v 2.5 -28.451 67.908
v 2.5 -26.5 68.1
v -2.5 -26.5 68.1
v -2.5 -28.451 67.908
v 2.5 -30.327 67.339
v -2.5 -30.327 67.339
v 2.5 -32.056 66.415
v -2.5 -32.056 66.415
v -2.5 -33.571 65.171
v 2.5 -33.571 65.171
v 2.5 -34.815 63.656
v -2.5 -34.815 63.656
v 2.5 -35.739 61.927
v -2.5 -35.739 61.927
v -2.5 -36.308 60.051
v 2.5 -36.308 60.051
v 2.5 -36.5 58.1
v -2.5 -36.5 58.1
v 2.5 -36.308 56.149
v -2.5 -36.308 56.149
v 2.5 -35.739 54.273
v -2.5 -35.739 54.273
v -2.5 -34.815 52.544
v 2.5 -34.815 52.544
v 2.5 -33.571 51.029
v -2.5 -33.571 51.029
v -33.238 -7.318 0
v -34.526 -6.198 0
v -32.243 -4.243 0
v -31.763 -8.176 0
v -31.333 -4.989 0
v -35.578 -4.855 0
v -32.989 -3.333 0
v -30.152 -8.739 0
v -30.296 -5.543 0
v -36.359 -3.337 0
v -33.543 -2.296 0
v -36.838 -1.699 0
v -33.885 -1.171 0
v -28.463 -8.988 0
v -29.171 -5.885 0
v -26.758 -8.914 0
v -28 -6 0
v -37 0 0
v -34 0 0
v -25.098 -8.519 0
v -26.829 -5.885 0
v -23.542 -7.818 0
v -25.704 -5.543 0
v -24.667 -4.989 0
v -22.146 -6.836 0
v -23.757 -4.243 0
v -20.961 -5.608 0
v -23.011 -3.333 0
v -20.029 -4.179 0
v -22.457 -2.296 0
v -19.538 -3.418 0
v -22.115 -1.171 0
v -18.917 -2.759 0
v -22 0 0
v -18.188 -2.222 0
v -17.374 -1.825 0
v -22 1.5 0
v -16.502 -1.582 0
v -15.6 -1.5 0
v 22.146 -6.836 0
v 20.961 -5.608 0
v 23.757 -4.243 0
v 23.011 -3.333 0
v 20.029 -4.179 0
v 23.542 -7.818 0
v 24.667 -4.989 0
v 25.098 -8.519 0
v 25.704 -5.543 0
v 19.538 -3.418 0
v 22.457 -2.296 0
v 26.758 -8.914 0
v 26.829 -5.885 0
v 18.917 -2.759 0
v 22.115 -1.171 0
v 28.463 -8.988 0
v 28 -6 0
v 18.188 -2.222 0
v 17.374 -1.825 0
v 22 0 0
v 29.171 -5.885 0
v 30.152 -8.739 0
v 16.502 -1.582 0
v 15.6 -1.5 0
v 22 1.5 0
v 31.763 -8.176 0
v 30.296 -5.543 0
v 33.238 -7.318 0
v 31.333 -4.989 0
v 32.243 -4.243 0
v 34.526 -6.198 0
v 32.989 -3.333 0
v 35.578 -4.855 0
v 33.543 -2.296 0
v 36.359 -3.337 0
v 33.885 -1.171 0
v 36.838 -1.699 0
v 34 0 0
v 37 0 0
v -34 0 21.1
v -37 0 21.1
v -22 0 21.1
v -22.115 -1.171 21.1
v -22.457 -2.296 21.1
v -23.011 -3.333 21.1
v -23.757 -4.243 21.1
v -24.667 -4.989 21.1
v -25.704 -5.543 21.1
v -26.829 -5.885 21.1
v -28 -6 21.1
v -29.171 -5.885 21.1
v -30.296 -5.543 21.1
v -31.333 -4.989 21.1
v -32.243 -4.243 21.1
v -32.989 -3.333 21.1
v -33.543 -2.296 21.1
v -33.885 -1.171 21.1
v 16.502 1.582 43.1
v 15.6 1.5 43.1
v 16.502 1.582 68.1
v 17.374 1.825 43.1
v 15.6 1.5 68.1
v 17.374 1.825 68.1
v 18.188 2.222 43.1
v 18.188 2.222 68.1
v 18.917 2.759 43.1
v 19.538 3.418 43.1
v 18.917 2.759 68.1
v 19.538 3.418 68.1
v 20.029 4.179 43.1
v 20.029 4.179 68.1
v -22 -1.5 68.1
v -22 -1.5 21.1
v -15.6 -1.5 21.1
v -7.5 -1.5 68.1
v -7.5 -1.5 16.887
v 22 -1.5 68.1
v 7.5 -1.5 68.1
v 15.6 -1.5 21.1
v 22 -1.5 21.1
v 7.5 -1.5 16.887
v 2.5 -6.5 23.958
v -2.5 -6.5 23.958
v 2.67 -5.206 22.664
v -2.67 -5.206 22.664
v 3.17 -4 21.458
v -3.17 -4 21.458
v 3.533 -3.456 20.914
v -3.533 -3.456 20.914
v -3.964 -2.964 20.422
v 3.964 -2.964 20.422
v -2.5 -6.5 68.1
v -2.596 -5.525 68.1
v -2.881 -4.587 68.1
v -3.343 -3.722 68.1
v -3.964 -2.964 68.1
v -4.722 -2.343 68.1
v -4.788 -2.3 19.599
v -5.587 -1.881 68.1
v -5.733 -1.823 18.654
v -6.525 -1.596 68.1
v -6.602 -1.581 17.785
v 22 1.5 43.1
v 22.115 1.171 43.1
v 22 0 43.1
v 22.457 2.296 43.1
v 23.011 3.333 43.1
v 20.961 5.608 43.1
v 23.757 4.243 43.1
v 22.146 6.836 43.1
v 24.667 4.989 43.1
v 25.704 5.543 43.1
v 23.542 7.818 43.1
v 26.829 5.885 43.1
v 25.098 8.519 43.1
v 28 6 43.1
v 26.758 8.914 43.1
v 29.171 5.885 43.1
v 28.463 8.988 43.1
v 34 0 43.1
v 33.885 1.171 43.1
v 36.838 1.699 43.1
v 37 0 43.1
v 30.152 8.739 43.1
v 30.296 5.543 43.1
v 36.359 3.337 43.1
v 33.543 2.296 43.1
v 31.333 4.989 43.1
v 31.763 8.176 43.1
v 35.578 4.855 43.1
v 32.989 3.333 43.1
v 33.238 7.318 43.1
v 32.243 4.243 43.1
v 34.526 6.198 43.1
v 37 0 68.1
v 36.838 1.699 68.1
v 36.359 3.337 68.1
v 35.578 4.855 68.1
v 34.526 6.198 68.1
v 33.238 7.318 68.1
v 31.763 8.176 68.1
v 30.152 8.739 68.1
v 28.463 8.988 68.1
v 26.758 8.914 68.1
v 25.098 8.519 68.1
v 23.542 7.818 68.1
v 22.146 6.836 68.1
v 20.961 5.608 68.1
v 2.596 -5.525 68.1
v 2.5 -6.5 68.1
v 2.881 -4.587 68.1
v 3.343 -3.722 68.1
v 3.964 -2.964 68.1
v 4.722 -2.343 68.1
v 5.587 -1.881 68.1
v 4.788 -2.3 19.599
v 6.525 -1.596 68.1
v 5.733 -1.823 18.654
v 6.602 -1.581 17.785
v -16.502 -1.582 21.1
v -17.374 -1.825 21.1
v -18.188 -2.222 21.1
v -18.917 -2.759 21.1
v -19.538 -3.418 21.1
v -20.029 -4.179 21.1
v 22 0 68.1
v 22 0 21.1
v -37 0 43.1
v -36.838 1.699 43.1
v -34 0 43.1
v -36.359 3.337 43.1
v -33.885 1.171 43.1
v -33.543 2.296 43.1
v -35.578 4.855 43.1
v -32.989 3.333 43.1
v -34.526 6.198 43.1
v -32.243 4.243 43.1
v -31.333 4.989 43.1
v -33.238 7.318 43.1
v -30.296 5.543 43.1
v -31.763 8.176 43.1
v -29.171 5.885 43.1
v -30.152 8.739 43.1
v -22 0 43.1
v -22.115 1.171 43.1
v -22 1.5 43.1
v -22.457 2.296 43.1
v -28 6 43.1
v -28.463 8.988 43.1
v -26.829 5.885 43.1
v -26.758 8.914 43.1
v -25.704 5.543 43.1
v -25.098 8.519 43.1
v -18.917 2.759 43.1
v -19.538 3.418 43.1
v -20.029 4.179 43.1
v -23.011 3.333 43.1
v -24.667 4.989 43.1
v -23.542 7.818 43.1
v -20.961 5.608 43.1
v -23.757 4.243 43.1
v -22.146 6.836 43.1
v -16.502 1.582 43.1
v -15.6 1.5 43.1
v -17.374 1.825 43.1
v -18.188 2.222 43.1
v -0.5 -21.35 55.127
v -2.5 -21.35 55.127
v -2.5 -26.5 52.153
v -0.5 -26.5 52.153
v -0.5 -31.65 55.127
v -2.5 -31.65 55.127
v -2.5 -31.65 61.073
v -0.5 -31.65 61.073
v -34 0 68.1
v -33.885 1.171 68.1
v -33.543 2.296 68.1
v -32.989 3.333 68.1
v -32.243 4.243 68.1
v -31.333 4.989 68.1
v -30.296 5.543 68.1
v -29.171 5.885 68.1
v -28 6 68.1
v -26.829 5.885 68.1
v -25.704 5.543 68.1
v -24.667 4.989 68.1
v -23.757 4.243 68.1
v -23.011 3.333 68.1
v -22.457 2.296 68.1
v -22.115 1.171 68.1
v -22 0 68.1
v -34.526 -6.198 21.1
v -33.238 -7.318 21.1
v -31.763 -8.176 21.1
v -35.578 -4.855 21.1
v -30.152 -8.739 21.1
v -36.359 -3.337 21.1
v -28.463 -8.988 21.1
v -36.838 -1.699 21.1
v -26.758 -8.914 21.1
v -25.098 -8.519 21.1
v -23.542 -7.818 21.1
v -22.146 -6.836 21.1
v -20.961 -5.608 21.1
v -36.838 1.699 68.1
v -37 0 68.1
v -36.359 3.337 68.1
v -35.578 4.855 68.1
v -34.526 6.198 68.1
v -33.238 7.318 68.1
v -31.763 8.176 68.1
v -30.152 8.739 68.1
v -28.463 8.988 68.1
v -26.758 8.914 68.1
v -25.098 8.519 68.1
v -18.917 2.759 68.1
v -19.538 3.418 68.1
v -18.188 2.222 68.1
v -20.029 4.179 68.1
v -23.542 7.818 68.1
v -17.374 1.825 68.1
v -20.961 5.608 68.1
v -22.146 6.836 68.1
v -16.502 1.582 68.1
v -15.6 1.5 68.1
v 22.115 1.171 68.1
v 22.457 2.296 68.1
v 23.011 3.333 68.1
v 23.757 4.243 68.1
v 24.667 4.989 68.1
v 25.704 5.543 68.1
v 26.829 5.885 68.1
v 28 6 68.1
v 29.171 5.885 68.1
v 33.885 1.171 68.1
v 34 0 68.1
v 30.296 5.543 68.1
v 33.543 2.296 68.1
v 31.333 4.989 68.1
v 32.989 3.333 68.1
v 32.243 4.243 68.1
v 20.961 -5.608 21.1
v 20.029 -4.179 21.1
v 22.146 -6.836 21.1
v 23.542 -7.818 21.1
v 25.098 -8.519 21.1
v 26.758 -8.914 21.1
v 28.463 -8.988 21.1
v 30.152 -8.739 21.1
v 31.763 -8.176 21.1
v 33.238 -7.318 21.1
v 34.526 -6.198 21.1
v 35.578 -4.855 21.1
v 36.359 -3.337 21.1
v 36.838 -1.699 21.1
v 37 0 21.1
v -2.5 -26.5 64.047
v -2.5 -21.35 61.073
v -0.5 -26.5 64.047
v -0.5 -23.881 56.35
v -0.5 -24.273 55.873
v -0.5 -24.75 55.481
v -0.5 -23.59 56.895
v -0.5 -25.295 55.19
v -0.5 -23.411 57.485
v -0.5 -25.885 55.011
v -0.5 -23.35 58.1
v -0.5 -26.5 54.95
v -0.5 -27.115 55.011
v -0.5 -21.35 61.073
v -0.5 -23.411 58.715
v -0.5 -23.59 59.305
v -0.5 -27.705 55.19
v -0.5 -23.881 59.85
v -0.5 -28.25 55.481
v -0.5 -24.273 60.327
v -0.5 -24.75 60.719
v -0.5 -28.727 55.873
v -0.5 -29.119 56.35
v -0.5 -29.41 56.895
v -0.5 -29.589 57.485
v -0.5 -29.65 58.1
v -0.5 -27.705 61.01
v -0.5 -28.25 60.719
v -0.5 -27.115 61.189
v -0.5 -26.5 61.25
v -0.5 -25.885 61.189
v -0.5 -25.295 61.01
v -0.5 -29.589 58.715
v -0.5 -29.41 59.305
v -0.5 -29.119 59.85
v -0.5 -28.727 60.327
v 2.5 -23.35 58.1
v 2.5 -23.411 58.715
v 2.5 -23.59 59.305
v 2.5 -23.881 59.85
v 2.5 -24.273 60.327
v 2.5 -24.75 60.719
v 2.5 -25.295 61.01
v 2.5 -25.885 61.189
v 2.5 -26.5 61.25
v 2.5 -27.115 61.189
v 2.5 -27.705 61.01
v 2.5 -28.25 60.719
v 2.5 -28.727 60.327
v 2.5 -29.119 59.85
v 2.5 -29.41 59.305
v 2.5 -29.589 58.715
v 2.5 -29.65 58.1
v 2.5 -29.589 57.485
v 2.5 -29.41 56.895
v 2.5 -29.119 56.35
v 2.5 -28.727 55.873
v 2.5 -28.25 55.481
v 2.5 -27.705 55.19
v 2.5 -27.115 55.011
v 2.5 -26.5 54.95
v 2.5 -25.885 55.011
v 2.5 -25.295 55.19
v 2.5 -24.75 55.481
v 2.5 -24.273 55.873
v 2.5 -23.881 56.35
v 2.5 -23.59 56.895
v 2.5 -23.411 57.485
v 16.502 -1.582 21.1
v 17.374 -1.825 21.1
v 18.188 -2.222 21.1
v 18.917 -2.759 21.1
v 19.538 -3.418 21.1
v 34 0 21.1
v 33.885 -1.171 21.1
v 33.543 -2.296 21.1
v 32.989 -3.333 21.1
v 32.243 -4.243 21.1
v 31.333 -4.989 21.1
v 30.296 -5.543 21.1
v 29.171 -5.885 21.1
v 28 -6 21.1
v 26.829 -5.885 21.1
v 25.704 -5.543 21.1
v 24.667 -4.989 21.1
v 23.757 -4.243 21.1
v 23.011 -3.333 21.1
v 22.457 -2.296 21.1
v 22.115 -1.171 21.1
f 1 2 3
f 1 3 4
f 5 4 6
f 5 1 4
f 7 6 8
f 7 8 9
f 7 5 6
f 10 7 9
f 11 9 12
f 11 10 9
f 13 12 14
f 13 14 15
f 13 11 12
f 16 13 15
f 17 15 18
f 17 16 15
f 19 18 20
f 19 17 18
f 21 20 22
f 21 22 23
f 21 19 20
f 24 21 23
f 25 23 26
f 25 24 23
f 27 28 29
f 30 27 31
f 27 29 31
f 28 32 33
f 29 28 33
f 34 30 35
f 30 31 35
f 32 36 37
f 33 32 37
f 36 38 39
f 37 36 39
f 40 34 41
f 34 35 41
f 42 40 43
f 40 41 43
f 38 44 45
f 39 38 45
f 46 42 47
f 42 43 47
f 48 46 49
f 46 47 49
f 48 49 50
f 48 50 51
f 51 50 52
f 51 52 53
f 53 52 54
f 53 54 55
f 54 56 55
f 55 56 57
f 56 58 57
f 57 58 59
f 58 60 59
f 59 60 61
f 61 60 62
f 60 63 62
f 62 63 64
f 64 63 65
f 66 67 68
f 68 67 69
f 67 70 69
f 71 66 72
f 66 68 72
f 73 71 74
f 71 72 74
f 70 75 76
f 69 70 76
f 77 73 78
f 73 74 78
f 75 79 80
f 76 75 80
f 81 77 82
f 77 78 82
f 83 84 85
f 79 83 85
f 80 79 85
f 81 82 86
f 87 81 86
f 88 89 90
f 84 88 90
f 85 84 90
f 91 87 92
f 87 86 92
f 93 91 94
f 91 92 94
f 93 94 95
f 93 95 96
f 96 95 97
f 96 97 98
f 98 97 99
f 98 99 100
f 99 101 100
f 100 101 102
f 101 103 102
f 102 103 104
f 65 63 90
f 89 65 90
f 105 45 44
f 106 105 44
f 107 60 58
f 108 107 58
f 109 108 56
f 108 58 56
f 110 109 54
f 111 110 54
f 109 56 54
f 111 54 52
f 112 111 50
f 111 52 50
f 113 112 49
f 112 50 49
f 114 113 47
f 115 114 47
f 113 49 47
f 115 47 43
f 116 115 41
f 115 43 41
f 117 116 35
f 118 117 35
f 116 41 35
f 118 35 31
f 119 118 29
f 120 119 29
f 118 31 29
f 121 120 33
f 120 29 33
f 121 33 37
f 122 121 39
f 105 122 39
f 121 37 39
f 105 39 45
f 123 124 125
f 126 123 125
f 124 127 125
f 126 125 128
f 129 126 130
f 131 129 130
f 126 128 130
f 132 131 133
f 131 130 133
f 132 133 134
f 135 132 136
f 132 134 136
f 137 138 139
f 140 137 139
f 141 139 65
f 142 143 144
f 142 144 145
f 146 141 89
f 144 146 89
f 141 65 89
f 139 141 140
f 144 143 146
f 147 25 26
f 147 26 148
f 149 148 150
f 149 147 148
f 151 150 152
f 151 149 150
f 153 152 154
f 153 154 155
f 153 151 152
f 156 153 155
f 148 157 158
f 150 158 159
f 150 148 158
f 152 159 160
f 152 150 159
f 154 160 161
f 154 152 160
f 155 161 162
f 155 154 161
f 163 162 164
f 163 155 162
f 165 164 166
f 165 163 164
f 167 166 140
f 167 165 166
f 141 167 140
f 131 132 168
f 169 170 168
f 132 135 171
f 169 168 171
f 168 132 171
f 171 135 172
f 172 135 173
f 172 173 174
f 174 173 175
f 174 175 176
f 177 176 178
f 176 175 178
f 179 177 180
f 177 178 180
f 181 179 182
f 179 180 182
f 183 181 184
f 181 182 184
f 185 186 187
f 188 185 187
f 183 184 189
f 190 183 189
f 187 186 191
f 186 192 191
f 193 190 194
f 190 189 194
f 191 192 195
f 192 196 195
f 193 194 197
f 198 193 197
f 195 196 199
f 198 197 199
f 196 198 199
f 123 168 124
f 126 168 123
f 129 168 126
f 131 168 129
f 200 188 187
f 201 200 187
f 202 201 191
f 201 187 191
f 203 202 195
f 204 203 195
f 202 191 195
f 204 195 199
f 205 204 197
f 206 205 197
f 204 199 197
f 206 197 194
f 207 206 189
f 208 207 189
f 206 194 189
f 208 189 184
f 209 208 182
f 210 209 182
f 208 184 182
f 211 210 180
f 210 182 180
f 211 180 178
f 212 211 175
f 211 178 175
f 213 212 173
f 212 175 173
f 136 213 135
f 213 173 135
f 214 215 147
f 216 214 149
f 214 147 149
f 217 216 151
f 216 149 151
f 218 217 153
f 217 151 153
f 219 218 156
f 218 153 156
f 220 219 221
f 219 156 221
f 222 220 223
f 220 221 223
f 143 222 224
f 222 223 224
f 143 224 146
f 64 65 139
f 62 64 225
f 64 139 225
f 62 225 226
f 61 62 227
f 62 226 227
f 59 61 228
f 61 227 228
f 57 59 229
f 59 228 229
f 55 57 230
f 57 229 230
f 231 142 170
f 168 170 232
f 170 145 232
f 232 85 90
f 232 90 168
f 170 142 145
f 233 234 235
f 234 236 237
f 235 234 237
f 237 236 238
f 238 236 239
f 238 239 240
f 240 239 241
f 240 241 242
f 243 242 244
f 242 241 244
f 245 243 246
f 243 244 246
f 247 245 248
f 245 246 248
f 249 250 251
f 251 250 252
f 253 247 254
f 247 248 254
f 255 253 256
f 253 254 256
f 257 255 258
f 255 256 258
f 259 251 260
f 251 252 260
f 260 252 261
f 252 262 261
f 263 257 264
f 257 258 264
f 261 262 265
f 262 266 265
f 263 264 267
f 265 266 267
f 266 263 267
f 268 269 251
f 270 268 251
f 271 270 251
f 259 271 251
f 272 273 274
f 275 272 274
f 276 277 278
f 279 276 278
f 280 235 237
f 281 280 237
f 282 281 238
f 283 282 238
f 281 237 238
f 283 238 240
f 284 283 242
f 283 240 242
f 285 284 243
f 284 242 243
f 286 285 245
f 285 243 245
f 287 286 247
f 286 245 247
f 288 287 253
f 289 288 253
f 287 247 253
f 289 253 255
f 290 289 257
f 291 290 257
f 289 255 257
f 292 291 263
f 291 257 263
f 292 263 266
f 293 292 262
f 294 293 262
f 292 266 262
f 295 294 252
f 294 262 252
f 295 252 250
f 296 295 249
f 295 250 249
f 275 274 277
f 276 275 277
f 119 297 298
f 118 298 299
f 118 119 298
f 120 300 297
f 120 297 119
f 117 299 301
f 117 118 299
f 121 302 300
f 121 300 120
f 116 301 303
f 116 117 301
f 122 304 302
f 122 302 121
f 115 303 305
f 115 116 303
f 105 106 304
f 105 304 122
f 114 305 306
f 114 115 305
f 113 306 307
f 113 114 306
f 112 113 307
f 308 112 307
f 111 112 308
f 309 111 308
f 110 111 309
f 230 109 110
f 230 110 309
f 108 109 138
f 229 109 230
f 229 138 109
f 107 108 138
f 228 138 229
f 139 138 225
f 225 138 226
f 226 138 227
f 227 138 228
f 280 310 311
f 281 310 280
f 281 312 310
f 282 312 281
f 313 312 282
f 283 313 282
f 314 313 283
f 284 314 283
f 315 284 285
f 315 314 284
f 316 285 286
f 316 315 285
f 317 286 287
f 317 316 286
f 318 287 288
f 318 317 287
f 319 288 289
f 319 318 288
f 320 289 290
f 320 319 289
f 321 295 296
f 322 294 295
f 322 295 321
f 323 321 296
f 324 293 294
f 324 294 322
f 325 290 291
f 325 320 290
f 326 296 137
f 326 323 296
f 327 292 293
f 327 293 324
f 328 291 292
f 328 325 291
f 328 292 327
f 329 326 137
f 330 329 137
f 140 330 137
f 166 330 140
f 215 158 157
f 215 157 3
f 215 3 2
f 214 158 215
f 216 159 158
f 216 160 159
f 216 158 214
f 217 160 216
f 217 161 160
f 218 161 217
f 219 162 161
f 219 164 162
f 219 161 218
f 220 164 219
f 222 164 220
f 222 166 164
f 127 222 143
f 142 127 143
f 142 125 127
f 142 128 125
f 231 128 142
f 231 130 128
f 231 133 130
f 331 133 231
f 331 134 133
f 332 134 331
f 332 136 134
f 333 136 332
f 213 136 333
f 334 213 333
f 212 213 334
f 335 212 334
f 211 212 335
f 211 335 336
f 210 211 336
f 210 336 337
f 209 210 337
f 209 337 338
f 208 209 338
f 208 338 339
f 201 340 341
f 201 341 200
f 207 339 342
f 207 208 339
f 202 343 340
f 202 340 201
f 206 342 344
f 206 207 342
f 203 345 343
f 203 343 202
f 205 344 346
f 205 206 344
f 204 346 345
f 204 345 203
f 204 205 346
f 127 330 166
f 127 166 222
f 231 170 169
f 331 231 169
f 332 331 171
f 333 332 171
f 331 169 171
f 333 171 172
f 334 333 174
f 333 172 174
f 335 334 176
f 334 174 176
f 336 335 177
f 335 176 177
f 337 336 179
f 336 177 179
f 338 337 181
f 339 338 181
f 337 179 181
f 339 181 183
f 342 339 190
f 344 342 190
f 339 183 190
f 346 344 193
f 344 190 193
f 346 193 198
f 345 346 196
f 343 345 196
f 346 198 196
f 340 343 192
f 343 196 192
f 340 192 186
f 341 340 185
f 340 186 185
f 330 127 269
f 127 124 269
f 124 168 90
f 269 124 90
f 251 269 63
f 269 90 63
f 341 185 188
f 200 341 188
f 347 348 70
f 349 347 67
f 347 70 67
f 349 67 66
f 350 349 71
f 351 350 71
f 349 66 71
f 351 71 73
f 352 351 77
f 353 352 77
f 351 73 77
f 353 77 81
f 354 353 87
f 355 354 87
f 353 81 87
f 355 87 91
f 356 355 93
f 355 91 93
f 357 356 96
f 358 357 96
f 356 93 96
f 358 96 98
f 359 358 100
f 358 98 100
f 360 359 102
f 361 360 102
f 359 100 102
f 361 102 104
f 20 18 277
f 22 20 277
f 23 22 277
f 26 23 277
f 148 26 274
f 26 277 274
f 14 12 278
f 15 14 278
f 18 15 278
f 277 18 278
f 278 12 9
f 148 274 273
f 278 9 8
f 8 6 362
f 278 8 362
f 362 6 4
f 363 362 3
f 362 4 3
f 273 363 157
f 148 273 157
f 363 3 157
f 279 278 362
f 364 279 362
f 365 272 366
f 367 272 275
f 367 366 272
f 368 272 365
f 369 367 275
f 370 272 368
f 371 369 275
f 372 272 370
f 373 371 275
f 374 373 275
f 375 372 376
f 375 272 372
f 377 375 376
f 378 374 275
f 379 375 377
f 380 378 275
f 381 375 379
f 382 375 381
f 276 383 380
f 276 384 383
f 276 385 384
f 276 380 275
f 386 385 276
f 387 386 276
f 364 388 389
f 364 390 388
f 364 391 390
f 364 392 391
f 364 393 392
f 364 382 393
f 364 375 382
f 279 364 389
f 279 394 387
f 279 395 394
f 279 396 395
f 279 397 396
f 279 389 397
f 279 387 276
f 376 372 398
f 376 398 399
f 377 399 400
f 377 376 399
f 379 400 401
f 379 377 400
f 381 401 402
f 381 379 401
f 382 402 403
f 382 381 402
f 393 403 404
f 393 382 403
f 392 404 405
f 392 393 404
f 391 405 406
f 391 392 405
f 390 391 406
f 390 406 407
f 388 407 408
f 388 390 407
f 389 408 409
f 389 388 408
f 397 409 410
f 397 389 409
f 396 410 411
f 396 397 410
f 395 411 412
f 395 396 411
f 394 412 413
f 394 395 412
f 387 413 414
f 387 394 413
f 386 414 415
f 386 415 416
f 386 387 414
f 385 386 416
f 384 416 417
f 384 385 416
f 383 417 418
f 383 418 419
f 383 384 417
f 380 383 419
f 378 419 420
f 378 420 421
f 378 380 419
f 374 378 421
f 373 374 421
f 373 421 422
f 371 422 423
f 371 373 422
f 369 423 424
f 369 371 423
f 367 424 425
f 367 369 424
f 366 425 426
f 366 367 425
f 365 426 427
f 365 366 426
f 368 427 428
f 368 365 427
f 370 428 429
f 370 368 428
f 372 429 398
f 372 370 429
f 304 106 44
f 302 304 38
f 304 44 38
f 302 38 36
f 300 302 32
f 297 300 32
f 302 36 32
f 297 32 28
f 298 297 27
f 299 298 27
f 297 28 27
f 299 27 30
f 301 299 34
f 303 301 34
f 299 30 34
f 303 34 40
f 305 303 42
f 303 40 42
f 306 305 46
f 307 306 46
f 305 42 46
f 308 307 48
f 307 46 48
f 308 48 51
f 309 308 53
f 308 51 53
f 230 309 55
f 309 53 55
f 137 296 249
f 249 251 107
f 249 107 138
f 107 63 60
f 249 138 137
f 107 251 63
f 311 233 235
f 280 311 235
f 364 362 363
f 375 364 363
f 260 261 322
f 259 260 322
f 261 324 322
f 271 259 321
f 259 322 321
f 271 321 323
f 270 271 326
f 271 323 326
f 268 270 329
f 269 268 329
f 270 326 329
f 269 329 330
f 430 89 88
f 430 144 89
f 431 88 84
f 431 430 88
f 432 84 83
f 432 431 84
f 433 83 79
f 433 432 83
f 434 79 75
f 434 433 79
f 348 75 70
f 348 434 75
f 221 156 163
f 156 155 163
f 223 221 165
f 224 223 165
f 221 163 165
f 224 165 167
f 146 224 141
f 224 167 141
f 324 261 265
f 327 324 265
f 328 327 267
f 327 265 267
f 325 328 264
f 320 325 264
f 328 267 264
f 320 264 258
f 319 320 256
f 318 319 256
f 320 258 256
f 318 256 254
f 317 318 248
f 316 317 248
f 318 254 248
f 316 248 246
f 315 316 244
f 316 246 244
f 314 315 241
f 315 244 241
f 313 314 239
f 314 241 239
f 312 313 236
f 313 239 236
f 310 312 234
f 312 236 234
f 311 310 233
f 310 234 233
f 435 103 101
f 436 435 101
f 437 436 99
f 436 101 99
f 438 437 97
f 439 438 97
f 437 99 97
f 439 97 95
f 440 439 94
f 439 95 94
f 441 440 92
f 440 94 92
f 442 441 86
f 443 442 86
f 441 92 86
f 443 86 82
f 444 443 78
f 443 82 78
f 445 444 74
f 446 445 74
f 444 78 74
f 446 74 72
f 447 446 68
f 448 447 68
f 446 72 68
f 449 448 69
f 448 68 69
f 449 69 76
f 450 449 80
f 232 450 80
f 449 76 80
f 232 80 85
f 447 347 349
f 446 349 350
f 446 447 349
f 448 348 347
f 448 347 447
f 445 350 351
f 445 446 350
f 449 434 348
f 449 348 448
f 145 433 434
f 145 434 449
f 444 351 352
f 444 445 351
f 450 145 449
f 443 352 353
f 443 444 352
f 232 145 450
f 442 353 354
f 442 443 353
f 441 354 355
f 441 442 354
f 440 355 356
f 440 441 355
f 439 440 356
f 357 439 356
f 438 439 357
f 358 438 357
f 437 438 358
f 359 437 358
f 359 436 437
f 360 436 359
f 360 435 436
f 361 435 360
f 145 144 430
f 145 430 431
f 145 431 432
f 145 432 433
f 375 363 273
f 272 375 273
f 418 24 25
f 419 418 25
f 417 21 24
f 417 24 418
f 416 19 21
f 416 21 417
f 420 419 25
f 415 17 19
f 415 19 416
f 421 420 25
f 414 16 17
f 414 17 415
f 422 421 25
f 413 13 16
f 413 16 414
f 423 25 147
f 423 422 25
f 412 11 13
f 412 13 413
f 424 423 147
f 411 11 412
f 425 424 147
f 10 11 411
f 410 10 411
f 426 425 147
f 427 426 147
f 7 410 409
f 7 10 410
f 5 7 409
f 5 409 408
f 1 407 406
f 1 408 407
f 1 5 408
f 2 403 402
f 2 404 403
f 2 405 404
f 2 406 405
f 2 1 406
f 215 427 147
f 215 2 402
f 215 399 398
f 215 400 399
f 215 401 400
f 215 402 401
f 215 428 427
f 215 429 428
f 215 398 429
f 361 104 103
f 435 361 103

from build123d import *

# Parameters (mm, degrees)
F1_DEPTH = 21.1
F3_DEPTH = 22
F5_DEPTH = 25
F6_R     = 3.15
F7_DEPTH = 2.5
F8_R     = 3.15
F9_DEPTH = 2
F10_R    = 5
F11_R    = 5
F12_R    = 5


with BuildPart() as f1:
    # F0 (on Top) → F1 (new body)
    with BuildSketch(Plane.XY):
        with BuildLine():
            ThreePointArc((-22, 0), (-28, -6), (-34, 0))
            Line((-34, 0), (-37, 0))
            ThreePointArc((-37, 0), (-28.7526363425, -8.9684747051), (-19.1258803254, -1.5))
            Line((-19.1258803254, -1.5), (19.1258803254, -1.5))
            ThreePointArc((19.1258803254, -1.5), (28.7526363425, -8.9684747051), (37, 0))
            Line((37, 0), (34, 0))
            ThreePointArc((34, 0), (28, -6), (22, 0))
            Line((22, 0), (22, 1.5))
            Line((22, 1.5), (-22, 1.5))
            Line((-22, 1.5), (-22, 0))
        make_face()
    extrude(amount=F1_DEPTH)

    # F2 (on face) → F3 (join)
    with BuildSketch(Plane.XY.offset(21.1)):
        Polygon((-22, 0), (-22, -1.5), (-19.1258803254, -1.5), (19.1258803254, -1.5), (22, -1.5), (22, 0), (22, 1.5), (-22, 1.5), align=None)
    extrude(amount=F3_DEPTH)

    # F4 (on face) → F5 (join)
    with BuildSketch(Plane.XY.offset(43.1)):
        with BuildLine():
            ThreePointArc((-34, 0), (-28, 6), (-22, 0))
            Line((-22, 0), (-22, -1.5))
            Line((-22, -1.5), (22, -1.5))
            Line((22, -1.5), (22, 0))
            ThreePointArc((22, 0), (28, 6), (34, 0))
            Line((34, 0), (37, 0))
            ThreePointArc((37, 0), (28.7526363425, 8.9684747051), (19.1258803254, 1.5))
            Line((19.1258803254, 1.5), (-19.1258803254, 1.5))
            ThreePointArc((-19.1258803254, 1.5), (-28.7526363425, 8.9684747051), (-37, 0))
            Line((-37, 0), (-34, 0))
        make_face()
    extrude(amount=F5_DEPTH)

    # F6 (on Right) → F7 (join, symmetric)
    with BuildSketch(Plane.YZ):
        with BuildLine():
            Line((0, 68.1), (-26.5, 68.1))
            ThreePointArc((-26.5, 68.1), (-35.7387953251, 61.9268343237), (-33.5710678119, 51.0289321881))
            Line((-33.5710678119, 51.0289321881), (0, 17.4578643763))
            Line((0, 17.4578643763), (0, 68.1))
        make_face()
        with Locations((-26.5, 58.1)):
            Circle(F6_R, mode=Mode.SUBTRACT)
    extrude(amount=F7_DEPTH, both=True)

    # F8 (on face) → F9 (cut)
    with BuildSketch(Plane(origin=(-2.5, 0, 0), x_dir=(0, -1, 0), z_dir=(-1, 0, 0))):
        Polygon((31.65, 61.0733538863), (26.5, 64.0467077727), (21.35, 61.0733538863), (21.35, 55.1266461137), (26.5, 52.1532922273), (31.65, 55.1266461137), align=None)
        with Locations((26.5, 58.1)):
            Circle(F8_R, mode=Mode.SUBTRACT)
    extrude(amount=-F9_DEPTH, mode=Mode.SUBTRACT)

    # F10
    f10_edges = [f1.edges().sort_by_distance(p)[0] for p in [
        (-2.5, -1.5, 43.528932),
        (2.5, -1.5, 43.528932),
    ]]
    fillet(f10_edges, radius=F10_R)

    # F11
    f11_edges = [f1.edges().sort_by_distance(p)[0] for p in [
        (0, -1.5, 18.957864),
    ]]
    fillet(f11_edges, radius=F11_R)

    # F12
    f12_edges = [f1.edges().sort_by_distance(p)[0] for p in [
        (-19.12588, -1.5, 10.55),
        (19.12588, -1.5, 10.55),
        (-19.12588, 1.5, 55.6),
        (19.12588, 1.5, 55.6),
    ]]
    fillet(f12_edges, radius=F12_R)


solid = f1.part
